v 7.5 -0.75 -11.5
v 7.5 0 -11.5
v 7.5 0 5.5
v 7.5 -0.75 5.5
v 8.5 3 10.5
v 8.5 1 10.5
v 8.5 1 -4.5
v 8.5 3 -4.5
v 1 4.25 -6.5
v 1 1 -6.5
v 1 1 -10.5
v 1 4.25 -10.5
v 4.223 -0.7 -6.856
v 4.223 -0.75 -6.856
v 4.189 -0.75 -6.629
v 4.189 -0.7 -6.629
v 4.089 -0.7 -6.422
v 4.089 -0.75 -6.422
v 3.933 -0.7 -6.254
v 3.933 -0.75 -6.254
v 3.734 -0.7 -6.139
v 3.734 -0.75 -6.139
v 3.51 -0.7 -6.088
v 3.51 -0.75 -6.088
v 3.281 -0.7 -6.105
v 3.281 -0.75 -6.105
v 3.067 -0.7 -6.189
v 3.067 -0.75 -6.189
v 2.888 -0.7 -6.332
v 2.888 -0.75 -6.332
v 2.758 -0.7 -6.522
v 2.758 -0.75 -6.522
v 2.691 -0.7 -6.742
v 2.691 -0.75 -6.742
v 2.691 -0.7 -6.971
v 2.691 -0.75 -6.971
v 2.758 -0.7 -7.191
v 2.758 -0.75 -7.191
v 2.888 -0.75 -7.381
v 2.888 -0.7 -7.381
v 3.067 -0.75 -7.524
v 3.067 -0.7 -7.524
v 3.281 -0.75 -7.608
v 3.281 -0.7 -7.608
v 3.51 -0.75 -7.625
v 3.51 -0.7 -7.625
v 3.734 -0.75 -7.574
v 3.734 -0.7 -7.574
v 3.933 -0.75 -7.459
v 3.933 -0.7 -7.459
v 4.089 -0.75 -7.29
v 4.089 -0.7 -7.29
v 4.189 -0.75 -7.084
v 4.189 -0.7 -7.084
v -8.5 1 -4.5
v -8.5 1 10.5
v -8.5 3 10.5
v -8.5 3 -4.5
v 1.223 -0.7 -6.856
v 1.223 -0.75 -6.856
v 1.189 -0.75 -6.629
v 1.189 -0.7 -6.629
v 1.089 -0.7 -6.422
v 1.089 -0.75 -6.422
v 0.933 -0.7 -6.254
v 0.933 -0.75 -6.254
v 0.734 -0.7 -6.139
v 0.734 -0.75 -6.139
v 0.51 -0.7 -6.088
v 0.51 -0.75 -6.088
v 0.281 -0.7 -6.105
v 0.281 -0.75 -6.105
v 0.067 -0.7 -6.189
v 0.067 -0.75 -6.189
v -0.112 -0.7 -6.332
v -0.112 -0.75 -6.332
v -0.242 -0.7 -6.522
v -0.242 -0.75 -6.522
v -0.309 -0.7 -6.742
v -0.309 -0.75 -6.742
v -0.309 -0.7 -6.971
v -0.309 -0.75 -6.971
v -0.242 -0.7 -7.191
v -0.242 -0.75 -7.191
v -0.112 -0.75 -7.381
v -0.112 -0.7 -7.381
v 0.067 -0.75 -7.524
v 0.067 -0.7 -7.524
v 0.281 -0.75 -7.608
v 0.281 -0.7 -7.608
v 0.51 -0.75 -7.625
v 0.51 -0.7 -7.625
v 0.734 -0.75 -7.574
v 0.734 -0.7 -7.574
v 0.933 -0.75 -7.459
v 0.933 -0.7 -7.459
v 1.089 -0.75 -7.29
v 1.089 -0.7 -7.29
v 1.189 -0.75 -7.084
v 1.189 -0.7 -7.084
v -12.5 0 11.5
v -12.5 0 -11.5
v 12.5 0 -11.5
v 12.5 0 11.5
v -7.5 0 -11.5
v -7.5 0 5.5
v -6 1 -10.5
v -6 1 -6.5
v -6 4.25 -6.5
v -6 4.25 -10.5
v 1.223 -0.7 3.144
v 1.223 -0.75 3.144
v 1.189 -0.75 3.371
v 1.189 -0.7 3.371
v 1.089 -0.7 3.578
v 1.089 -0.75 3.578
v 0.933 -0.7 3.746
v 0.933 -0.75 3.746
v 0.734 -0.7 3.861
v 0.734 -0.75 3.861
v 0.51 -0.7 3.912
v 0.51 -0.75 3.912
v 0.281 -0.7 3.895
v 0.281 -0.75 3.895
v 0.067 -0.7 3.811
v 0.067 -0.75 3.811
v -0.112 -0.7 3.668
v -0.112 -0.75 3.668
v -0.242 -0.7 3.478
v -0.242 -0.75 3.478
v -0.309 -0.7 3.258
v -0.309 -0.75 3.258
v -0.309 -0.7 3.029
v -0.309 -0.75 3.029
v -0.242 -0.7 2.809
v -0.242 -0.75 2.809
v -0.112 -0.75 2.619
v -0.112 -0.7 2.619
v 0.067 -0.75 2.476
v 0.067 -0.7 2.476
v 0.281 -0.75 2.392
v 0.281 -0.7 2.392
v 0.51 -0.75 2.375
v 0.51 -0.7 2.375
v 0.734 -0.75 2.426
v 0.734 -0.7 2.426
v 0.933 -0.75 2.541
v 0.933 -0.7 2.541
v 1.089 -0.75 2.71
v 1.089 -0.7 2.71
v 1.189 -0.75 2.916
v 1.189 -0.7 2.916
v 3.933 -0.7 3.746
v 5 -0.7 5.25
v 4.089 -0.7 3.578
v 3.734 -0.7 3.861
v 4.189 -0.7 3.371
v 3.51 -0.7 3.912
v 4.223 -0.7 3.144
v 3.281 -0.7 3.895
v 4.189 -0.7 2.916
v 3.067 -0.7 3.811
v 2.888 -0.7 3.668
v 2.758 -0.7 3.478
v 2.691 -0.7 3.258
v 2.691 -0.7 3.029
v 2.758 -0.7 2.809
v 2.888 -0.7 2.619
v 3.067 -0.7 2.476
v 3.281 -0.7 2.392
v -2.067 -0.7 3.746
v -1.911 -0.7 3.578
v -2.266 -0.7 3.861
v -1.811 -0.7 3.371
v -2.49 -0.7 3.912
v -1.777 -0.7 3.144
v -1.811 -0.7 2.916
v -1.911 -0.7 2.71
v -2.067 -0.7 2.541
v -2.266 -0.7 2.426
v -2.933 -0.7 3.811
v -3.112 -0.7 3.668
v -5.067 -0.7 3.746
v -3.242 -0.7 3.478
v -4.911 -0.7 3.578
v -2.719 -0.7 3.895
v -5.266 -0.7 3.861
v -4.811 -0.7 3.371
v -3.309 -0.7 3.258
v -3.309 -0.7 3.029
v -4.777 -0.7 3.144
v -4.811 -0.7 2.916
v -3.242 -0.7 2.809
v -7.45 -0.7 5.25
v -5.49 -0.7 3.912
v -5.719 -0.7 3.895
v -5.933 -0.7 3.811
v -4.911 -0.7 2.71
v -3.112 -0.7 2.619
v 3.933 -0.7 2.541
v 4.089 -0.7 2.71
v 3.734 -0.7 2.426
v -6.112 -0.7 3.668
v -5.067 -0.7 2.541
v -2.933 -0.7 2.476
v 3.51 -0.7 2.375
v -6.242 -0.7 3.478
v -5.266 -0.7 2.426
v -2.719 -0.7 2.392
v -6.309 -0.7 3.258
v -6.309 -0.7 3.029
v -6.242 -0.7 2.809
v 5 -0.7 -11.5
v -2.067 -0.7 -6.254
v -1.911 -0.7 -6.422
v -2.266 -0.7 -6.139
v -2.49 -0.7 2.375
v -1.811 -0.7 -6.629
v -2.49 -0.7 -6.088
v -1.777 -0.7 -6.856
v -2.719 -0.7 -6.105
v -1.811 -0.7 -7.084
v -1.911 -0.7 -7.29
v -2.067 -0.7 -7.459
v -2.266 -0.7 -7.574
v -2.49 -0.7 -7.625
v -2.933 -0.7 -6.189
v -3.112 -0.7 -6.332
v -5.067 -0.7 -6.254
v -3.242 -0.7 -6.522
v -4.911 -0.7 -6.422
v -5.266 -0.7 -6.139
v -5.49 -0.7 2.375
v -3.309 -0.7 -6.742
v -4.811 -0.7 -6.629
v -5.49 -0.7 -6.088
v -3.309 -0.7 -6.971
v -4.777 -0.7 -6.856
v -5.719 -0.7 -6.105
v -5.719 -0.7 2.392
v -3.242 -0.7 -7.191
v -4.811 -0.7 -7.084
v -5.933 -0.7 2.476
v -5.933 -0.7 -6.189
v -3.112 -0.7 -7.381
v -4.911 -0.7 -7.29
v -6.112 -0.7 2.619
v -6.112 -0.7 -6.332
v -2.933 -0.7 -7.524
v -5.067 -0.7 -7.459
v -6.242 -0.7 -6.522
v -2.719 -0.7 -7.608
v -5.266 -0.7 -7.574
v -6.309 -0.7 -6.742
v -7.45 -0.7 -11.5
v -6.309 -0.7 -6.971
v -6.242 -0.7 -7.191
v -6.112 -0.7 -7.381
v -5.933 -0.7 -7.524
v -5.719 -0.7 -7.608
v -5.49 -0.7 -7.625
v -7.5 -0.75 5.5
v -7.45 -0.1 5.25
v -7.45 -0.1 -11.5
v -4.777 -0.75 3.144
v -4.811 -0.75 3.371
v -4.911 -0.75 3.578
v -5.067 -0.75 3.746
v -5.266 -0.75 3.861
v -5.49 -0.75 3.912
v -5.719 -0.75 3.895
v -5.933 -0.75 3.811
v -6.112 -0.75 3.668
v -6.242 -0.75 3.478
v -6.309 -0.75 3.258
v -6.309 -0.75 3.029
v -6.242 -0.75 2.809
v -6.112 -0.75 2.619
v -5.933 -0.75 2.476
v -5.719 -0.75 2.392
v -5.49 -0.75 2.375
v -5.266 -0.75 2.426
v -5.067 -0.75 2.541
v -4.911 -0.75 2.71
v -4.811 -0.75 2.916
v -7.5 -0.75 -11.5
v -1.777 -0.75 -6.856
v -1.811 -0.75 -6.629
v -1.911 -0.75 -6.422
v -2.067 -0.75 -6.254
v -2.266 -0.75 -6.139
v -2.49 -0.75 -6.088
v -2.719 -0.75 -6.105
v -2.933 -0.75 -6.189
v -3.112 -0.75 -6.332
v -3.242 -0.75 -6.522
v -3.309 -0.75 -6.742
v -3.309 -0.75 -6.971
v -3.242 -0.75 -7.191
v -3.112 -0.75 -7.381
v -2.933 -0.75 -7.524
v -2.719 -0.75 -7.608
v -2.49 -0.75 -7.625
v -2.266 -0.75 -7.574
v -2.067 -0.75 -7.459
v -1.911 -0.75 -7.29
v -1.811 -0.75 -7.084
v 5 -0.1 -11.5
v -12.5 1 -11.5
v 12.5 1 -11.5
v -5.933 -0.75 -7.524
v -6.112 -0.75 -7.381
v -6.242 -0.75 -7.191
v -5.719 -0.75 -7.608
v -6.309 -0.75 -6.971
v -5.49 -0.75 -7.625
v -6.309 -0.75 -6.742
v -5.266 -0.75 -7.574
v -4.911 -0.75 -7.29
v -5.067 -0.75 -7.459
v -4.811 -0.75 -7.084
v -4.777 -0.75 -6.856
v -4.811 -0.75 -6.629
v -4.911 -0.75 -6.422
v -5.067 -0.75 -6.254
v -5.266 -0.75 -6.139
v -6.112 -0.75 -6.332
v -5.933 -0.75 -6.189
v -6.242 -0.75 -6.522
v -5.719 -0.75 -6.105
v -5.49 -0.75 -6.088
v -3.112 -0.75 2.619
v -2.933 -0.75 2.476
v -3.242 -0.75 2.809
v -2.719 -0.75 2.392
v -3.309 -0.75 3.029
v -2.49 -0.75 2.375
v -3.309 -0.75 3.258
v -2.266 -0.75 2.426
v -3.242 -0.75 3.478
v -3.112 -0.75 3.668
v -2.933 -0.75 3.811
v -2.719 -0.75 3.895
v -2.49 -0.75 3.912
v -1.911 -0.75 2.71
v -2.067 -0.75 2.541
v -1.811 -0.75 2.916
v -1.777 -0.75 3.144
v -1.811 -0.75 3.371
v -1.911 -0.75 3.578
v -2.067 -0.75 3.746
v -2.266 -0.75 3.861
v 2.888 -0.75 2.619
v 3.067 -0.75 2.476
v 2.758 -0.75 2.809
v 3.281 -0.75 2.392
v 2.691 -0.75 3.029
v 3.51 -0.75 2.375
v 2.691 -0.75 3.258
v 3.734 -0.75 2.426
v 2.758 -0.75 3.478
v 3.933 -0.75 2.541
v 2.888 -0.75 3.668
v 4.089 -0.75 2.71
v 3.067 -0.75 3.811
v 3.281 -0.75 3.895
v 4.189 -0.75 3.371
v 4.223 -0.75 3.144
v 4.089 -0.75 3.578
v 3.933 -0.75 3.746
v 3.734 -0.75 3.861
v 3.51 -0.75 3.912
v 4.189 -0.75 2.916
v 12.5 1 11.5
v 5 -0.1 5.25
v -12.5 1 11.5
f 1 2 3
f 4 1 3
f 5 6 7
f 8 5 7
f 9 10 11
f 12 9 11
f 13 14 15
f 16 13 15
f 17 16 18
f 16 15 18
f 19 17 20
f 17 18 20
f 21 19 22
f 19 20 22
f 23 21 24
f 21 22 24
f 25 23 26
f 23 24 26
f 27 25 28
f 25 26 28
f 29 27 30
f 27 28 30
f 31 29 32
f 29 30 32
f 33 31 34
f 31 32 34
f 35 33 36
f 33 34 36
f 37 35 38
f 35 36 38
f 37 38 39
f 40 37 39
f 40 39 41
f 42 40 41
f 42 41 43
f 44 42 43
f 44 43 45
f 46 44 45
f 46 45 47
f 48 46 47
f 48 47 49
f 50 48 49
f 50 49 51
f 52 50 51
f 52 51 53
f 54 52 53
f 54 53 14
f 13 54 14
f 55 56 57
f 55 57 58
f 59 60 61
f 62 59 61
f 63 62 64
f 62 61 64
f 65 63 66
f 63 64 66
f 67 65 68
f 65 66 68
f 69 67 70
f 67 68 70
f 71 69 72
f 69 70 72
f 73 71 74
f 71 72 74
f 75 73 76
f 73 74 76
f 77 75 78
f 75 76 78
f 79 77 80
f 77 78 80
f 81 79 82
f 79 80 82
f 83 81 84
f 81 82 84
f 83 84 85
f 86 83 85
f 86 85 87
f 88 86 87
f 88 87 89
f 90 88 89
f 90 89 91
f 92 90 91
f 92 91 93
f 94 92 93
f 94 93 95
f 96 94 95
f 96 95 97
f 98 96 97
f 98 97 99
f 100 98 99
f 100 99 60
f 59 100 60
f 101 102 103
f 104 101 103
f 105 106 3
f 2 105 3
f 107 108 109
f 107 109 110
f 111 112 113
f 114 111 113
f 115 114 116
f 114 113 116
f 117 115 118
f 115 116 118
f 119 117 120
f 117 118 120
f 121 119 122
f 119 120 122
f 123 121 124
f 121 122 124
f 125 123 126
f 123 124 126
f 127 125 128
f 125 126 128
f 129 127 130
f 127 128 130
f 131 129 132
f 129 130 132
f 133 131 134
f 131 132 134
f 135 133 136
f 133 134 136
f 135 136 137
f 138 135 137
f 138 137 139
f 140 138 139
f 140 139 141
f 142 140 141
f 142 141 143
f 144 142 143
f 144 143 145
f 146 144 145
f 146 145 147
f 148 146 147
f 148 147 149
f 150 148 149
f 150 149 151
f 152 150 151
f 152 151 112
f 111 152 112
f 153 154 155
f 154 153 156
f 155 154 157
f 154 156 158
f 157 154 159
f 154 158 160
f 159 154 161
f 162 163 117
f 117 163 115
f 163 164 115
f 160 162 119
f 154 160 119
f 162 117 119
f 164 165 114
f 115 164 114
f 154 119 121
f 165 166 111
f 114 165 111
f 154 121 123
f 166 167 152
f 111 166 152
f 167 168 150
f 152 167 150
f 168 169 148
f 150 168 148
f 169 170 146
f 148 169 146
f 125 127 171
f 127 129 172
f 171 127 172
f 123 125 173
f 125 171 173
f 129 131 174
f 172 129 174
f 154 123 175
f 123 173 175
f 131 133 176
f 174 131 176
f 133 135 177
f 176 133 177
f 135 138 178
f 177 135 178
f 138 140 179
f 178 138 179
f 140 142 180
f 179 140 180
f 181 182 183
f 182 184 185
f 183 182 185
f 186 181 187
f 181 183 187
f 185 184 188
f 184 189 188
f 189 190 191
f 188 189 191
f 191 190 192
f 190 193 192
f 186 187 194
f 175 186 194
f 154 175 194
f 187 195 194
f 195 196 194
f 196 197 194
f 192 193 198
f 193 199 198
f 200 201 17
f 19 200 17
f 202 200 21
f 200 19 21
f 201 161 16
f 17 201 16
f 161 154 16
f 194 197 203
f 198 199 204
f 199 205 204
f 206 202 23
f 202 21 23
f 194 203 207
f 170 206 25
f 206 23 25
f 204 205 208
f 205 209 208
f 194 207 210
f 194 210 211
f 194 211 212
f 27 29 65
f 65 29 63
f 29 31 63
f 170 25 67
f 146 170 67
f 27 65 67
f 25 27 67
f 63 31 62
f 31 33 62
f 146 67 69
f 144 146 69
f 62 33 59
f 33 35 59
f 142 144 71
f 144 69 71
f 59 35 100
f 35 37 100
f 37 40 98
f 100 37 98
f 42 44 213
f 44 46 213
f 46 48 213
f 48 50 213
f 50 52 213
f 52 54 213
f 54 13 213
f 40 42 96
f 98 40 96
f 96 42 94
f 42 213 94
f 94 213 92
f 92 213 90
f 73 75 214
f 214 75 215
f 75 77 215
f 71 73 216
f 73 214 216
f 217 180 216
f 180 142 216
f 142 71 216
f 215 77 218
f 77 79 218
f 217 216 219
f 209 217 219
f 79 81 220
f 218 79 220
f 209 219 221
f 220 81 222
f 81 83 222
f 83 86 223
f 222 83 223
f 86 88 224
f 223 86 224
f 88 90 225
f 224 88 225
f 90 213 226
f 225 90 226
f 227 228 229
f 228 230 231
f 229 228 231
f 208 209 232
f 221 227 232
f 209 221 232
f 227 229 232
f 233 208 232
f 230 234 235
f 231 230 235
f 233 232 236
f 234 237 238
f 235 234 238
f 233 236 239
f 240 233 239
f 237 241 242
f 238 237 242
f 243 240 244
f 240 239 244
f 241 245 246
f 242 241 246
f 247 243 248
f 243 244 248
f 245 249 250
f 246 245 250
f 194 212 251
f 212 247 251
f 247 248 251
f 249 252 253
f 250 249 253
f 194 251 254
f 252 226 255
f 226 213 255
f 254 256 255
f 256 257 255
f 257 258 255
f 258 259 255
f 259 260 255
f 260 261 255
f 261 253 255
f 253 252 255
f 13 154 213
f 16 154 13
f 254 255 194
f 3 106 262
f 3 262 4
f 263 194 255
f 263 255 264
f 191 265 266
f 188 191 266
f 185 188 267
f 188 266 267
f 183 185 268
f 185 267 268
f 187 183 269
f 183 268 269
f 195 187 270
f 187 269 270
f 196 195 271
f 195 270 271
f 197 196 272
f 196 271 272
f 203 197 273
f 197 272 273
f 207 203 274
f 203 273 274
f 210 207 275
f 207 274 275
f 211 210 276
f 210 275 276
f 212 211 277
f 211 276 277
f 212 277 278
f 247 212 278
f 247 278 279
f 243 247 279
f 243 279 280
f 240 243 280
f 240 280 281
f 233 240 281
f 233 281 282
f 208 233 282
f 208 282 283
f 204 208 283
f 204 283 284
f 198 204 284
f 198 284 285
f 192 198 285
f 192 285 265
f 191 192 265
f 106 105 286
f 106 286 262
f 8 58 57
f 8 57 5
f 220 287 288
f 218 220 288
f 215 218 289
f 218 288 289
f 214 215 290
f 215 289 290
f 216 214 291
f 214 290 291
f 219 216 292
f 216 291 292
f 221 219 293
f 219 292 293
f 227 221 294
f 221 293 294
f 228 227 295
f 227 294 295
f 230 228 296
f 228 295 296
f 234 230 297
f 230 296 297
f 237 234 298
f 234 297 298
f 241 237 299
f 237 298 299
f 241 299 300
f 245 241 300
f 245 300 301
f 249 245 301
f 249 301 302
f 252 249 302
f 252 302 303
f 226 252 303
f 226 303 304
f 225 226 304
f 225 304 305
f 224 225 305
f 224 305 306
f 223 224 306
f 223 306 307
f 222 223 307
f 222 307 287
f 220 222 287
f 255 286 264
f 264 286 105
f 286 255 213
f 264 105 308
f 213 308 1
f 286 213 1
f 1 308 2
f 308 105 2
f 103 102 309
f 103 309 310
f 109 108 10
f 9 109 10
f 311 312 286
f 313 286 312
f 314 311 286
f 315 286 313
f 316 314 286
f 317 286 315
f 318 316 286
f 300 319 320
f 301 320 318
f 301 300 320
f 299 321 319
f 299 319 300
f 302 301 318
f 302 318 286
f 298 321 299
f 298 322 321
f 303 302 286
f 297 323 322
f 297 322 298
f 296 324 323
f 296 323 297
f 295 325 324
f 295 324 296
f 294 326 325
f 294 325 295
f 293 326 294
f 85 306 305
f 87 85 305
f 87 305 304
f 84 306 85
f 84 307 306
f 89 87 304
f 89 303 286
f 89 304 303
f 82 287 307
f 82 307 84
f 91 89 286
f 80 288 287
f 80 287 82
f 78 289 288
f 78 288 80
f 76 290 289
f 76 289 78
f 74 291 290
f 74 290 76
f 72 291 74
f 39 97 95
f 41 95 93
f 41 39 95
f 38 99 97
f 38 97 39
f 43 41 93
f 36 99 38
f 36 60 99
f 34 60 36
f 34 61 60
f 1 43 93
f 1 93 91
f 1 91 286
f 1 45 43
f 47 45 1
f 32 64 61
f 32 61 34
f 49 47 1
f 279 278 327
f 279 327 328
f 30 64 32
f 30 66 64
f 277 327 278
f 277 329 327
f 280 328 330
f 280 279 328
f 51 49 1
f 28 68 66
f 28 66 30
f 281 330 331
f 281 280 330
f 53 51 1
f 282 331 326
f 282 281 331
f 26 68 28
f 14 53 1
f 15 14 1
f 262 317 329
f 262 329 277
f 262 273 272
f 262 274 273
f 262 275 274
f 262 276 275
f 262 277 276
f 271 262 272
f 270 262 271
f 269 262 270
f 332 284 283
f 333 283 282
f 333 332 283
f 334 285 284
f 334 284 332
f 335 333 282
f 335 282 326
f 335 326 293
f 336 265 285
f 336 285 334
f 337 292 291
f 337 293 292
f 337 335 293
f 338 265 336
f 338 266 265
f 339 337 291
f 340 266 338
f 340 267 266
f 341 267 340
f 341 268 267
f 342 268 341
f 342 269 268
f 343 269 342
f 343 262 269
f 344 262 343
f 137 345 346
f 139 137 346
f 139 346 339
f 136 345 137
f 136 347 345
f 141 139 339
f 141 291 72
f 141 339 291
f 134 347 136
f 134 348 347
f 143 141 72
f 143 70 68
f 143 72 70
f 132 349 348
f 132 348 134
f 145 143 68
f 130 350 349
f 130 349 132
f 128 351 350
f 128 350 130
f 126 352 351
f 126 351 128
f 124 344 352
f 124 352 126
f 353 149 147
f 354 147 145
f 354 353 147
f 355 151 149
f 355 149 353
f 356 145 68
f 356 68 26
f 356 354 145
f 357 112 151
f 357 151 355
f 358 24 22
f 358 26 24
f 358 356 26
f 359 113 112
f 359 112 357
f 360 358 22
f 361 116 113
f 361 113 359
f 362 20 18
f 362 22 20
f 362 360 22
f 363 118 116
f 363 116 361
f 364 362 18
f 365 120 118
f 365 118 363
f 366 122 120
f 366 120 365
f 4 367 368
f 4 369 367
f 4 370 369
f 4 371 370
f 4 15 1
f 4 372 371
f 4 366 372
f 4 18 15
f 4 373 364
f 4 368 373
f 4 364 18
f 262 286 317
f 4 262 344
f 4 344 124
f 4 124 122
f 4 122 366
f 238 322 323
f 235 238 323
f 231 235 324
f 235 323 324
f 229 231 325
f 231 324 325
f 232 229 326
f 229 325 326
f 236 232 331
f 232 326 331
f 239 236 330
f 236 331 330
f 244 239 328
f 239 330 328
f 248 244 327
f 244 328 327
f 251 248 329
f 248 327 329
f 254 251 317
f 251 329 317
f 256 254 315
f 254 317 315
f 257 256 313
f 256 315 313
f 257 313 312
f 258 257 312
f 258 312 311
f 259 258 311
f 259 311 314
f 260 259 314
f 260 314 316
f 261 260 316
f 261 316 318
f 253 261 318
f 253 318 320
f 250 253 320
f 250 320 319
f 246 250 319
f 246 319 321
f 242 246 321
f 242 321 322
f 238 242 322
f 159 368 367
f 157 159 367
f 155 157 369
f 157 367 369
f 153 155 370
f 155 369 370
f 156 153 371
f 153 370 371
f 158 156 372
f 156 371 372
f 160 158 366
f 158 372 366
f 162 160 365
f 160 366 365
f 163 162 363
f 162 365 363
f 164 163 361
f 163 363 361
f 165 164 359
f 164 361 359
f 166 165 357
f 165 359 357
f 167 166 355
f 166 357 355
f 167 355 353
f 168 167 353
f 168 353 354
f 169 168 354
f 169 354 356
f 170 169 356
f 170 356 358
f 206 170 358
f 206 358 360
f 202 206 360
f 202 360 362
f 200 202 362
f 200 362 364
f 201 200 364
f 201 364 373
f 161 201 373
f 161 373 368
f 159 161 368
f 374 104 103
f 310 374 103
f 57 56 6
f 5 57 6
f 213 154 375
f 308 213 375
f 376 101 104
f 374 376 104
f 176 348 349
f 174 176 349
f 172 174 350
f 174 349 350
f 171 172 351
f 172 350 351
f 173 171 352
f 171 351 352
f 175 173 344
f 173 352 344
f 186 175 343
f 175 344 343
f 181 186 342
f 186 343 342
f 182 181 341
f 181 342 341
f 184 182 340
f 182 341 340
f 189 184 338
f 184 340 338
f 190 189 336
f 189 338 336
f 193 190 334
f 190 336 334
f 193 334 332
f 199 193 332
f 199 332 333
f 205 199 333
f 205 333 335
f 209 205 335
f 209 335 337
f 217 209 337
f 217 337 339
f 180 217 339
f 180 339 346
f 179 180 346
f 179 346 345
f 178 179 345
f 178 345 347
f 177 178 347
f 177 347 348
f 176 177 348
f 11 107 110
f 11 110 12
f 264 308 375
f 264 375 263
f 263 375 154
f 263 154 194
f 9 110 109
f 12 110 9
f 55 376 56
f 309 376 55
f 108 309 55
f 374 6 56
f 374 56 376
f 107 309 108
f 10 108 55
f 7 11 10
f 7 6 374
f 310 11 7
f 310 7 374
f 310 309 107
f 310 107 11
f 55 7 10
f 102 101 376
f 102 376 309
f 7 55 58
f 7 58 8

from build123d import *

# Parameters (mm, degrees)
SKETCH1_W           = 25
SKETCH1_H           = 23
BOSS_EXTRUDE1_DEPTH = 1
SKETCH2_W           = 17
SKETCH2_H           = 15
BOSS_EXTRUDE2_DEPTH = 2
SKETCH3_W           = 7
SKETCH3_H           = 4
BOSS_EXTRUDE3_DEPTH = 3.25
SKETCH4_W           = 15
SKETCH4_H           = 17
BOSS_EXTRUDE4_DEPTH = 0.75
SKETCH5_W           = 12.45
SKETCH5_H           = 0.6
CUT_EXTRUDE1_DEPTH  = 16.75
SKETCH6_R           = 0.770478249
CUT_EXTRUDE2_DEPTH  = 0.5


with BuildPart() as part:
    # Sketch1 → Boss-Extrude1 (new body)
    with BuildSketch(Plane(origin=(0, 0, 0), x_dir=(1, 0, 0), z_dir=(0, 1, 0))):
        Rectangle(SKETCH1_W, SKETCH1_H)
    extrude(amount=BOSS_EXTRUDE1_DEPTH)

    # Sketch2 → Boss-Extrude2 (add)
    with BuildSketch(Plane(origin=(0, 1, 0), x_dir=(1, 0, 0), z_dir=(0, 1, 0))):
        with Locations((0, -3)):
            Rectangle(SKETCH2_W, SKETCH2_H)
    extrude(amount=BOSS_EXTRUDE2_DEPTH)

    # Sketch3 → Boss-Extrude3 (add)
    with BuildSketch(Plane(origin=(0, 1, 0), x_dir=(1, 0, 0), z_dir=(0, 1, 0))):
        with Locations((-2.5, 8.5)):
            Rectangle(SKETCH3_W, SKETCH3_H)
    extrude(amount=BOSS_EXTRUDE3_DEPTH)


with BuildPart() as body_2:
    # Sketch4 → Boss-Extrude4 (new body)
    with BuildSketch(Plane.XZ):
        with Locations((0, -3)):
            Rectangle(SKETCH4_W, SKETCH4_H)
    extrude(amount=BOSS_EXTRUDE4_DEPTH)

    # Sketch5 → Cut-Extrude1 (cut)
    with BuildSketch(Plane(origin=(0, 0, -11.5), x_dir=(-1, 0, 0), z_dir=(0, 0, -1))):
        with Locations((1.225, -0.4)):
            Rectangle(SKETCH5_W, SKETCH5_H)
    extrude(amount=-CUT_EXTRUDE1_DEPTH, mode=Mode.SUBTRACT)

    # Sketch6 → Cut-Extrude2 (cut)
    with BuildSketch(Plane.XZ.offset(0.75)):
        with Locations((-5.547443391, 3.143551255)):
            Circle(SKETCH6_R)
        with Locations((-2.547443391, 3.143551255)):
            Circle(SKETCH6_R)
        with Locations((0.452556609, 3.143551255)):
            Circle(SKETCH6_R)
        with Locations((3.452556609, 3.143551255)):
            Circle(SKETCH6_R)
        with Locations((-2.547443391, -6.856448745)):
            Circle(SKETCH6_R)
        with Locations((0.452556609, -6.856448745)):
            Circle(SKETCH6_R)
        with Locations((3.452556609, -6.856448745)):
            Circle(SKETCH6_R)
        with Locations((-5.547443391, -6.856448745)):
            Circle(SKETCH6_R)
    extrude(amount=-CUT_EXTRUDE2_DEPTH, mode=Mode.SUBTRACT)


solid = Compound([part.part, body_2.part])
